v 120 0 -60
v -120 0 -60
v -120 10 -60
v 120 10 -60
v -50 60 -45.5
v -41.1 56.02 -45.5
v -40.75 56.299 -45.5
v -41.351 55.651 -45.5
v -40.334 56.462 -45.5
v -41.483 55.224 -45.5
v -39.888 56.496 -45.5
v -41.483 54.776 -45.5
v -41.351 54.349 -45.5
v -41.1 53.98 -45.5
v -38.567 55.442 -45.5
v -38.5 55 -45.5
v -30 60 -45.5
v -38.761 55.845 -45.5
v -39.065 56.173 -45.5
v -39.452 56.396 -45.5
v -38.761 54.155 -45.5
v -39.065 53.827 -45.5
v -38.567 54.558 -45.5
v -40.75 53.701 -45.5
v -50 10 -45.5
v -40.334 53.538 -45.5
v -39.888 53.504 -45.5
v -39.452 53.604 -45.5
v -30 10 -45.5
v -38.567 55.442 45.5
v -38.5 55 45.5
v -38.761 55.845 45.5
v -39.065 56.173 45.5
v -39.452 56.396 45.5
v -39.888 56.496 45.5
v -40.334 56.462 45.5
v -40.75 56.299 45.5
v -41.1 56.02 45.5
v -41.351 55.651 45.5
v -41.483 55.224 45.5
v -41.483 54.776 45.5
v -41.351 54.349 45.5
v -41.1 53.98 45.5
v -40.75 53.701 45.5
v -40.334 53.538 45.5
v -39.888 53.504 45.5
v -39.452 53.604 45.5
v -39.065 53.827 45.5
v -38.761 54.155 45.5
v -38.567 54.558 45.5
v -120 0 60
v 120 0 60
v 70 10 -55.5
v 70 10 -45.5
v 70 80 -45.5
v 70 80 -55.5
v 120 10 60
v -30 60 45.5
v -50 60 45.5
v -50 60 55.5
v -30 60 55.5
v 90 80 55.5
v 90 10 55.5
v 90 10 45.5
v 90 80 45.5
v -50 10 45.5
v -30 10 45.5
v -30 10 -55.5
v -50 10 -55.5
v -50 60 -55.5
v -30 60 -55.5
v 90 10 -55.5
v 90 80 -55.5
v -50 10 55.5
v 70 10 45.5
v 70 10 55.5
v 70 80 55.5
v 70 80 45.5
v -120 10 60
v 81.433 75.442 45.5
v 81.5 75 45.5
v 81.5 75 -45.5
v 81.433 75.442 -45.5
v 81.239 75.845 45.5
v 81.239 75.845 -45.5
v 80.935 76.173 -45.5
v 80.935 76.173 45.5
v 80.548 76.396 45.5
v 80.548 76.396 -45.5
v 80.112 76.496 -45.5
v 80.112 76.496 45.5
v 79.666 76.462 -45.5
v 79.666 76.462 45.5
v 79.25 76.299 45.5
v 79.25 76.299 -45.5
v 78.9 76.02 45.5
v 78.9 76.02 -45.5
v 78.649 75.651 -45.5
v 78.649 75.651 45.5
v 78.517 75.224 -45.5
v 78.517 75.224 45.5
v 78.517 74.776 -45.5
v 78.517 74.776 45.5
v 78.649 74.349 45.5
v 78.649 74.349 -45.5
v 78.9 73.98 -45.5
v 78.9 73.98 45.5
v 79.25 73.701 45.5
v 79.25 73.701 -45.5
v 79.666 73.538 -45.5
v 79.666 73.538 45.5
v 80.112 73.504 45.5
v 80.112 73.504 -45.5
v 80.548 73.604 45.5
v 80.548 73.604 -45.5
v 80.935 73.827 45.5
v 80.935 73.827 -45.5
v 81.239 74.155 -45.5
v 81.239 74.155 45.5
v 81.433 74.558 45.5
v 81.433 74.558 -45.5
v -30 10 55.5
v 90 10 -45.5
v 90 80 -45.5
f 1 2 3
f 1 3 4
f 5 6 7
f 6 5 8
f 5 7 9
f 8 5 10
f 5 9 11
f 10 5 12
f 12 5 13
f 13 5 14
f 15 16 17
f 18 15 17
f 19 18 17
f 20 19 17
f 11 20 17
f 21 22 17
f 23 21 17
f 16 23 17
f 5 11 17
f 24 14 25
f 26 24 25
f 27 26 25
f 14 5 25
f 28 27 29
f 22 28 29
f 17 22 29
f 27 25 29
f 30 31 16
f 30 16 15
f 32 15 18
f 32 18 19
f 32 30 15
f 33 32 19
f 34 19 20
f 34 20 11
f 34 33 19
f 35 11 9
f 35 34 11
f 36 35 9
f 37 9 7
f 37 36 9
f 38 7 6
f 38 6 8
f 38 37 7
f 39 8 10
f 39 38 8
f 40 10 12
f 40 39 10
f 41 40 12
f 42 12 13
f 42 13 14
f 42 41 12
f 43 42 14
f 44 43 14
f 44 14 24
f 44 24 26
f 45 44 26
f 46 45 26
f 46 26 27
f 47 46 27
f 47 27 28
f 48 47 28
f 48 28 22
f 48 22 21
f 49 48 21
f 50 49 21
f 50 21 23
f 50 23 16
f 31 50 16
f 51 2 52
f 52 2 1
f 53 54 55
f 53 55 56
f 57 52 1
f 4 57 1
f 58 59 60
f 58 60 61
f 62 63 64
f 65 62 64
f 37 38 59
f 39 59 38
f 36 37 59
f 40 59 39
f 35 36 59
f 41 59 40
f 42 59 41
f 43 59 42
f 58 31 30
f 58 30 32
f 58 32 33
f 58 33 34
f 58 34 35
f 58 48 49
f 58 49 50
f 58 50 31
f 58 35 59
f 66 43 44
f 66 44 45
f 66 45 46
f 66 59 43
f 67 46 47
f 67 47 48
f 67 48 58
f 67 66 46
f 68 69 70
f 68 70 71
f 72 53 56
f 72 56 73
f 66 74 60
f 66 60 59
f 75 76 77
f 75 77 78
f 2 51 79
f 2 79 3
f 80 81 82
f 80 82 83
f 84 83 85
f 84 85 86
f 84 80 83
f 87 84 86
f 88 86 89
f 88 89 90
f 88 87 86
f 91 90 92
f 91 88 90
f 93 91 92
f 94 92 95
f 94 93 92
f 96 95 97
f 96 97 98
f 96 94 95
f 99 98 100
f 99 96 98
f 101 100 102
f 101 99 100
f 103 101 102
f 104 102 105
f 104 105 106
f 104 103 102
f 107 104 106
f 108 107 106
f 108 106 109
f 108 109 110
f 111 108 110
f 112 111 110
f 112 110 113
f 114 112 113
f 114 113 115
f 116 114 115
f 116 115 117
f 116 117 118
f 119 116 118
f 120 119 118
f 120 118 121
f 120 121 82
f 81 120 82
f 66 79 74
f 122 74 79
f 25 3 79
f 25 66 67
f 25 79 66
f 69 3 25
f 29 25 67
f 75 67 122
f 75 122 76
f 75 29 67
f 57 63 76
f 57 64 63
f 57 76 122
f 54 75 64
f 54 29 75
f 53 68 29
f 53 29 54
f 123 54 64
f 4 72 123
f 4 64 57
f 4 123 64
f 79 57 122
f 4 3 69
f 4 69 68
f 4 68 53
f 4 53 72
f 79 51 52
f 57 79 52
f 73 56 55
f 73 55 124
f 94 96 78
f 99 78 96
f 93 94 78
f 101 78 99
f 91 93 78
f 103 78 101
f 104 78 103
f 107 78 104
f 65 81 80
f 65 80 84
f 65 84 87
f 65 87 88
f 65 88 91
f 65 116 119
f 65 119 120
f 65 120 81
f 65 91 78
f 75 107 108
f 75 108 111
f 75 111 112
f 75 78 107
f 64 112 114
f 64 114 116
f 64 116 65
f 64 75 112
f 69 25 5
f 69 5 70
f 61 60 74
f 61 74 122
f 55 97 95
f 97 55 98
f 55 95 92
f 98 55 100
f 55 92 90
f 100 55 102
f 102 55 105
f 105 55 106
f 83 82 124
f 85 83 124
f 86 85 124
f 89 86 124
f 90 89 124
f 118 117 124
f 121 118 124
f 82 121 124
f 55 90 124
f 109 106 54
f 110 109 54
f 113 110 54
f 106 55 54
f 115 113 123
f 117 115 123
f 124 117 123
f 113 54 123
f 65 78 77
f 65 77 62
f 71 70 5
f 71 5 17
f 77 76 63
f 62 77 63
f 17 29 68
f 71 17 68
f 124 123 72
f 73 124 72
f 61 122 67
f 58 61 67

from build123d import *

# Parameters (mm, degrees)
CROQUIS1_W              = 240
CROQUIS1_H              = 120
SALIENTE_EXTRUIR1_DEPTH = 10
CROQUIS2_W              = 20
CROQUIS2_H              = 10
SALIENTE_EXTRUIR2_DEPTH = 50
CROQUIS2_3_W            = 20
CROQUIS2_3_H            = 10
SALIENTE_EXTRUIR3_DEPTH = 70
CROQUIS3_R              = 1.5
SALIENTE_EXTRUIR4_DEPTH = 111


with BuildPart() as part:
    # Croquis1 → Saliente-Extruir1 (new body)
    with BuildSketch(Plane(origin=(0, 0, 0), x_dir=(1, 0, 0), z_dir=(0, 1, 0))):
        Rectangle(CROQUIS1_W, CROQUIS1_H)
    extrude(amount=SALIENTE_EXTRUIR1_DEPTH)

    # Croquis2 → Saliente-Extruir2 (add)
    with BuildSketch(Plane(origin=(0, 10, 0), x_dir=(1, 0, 0), z_dir=(0, 1, 0))):
        with Locations((-40, 50.5)):
            Rectangle(CROQUIS2_W, CROQUIS2_H)
        with Locations((-40, -50.5)):
            Rectangle(CROQUIS2_W, CROQUIS2_H)
    extrude(amount=SALIENTE_EXTRUIR2_DEPTH)

    # Croquis2<3> → Saliente-Extruir3 (add)
    with BuildSketch(Plane(origin=(0, 10, 0), x_dir=(1, 0, 0), z_dir=(0, 1, 0))):
        with Locations((80, 50.5)):
            Rectangle(CROQUIS2_3_W, CROQUIS2_3_H)
        with Locations((80, -50.5)):
            Rectangle(CROQUIS2_3_W, CROQUIS2_3_H)
    extrude(amount=SALIENTE_EXTRUIR3_DEPTH)

    # Croquis3 → Saliente-Extruir4 (add)
    with BuildSketch(Plane.XY.offset(55.5)):
        with Locations((-40, 55)):
            Circle(CROQUIS3_R)
        with Locations((80, 75)):
            Circle(CROQUIS3_R)
    extrude(amount=-SALIENTE_EXTRUIR4_DEPTH)


solid = part.part
